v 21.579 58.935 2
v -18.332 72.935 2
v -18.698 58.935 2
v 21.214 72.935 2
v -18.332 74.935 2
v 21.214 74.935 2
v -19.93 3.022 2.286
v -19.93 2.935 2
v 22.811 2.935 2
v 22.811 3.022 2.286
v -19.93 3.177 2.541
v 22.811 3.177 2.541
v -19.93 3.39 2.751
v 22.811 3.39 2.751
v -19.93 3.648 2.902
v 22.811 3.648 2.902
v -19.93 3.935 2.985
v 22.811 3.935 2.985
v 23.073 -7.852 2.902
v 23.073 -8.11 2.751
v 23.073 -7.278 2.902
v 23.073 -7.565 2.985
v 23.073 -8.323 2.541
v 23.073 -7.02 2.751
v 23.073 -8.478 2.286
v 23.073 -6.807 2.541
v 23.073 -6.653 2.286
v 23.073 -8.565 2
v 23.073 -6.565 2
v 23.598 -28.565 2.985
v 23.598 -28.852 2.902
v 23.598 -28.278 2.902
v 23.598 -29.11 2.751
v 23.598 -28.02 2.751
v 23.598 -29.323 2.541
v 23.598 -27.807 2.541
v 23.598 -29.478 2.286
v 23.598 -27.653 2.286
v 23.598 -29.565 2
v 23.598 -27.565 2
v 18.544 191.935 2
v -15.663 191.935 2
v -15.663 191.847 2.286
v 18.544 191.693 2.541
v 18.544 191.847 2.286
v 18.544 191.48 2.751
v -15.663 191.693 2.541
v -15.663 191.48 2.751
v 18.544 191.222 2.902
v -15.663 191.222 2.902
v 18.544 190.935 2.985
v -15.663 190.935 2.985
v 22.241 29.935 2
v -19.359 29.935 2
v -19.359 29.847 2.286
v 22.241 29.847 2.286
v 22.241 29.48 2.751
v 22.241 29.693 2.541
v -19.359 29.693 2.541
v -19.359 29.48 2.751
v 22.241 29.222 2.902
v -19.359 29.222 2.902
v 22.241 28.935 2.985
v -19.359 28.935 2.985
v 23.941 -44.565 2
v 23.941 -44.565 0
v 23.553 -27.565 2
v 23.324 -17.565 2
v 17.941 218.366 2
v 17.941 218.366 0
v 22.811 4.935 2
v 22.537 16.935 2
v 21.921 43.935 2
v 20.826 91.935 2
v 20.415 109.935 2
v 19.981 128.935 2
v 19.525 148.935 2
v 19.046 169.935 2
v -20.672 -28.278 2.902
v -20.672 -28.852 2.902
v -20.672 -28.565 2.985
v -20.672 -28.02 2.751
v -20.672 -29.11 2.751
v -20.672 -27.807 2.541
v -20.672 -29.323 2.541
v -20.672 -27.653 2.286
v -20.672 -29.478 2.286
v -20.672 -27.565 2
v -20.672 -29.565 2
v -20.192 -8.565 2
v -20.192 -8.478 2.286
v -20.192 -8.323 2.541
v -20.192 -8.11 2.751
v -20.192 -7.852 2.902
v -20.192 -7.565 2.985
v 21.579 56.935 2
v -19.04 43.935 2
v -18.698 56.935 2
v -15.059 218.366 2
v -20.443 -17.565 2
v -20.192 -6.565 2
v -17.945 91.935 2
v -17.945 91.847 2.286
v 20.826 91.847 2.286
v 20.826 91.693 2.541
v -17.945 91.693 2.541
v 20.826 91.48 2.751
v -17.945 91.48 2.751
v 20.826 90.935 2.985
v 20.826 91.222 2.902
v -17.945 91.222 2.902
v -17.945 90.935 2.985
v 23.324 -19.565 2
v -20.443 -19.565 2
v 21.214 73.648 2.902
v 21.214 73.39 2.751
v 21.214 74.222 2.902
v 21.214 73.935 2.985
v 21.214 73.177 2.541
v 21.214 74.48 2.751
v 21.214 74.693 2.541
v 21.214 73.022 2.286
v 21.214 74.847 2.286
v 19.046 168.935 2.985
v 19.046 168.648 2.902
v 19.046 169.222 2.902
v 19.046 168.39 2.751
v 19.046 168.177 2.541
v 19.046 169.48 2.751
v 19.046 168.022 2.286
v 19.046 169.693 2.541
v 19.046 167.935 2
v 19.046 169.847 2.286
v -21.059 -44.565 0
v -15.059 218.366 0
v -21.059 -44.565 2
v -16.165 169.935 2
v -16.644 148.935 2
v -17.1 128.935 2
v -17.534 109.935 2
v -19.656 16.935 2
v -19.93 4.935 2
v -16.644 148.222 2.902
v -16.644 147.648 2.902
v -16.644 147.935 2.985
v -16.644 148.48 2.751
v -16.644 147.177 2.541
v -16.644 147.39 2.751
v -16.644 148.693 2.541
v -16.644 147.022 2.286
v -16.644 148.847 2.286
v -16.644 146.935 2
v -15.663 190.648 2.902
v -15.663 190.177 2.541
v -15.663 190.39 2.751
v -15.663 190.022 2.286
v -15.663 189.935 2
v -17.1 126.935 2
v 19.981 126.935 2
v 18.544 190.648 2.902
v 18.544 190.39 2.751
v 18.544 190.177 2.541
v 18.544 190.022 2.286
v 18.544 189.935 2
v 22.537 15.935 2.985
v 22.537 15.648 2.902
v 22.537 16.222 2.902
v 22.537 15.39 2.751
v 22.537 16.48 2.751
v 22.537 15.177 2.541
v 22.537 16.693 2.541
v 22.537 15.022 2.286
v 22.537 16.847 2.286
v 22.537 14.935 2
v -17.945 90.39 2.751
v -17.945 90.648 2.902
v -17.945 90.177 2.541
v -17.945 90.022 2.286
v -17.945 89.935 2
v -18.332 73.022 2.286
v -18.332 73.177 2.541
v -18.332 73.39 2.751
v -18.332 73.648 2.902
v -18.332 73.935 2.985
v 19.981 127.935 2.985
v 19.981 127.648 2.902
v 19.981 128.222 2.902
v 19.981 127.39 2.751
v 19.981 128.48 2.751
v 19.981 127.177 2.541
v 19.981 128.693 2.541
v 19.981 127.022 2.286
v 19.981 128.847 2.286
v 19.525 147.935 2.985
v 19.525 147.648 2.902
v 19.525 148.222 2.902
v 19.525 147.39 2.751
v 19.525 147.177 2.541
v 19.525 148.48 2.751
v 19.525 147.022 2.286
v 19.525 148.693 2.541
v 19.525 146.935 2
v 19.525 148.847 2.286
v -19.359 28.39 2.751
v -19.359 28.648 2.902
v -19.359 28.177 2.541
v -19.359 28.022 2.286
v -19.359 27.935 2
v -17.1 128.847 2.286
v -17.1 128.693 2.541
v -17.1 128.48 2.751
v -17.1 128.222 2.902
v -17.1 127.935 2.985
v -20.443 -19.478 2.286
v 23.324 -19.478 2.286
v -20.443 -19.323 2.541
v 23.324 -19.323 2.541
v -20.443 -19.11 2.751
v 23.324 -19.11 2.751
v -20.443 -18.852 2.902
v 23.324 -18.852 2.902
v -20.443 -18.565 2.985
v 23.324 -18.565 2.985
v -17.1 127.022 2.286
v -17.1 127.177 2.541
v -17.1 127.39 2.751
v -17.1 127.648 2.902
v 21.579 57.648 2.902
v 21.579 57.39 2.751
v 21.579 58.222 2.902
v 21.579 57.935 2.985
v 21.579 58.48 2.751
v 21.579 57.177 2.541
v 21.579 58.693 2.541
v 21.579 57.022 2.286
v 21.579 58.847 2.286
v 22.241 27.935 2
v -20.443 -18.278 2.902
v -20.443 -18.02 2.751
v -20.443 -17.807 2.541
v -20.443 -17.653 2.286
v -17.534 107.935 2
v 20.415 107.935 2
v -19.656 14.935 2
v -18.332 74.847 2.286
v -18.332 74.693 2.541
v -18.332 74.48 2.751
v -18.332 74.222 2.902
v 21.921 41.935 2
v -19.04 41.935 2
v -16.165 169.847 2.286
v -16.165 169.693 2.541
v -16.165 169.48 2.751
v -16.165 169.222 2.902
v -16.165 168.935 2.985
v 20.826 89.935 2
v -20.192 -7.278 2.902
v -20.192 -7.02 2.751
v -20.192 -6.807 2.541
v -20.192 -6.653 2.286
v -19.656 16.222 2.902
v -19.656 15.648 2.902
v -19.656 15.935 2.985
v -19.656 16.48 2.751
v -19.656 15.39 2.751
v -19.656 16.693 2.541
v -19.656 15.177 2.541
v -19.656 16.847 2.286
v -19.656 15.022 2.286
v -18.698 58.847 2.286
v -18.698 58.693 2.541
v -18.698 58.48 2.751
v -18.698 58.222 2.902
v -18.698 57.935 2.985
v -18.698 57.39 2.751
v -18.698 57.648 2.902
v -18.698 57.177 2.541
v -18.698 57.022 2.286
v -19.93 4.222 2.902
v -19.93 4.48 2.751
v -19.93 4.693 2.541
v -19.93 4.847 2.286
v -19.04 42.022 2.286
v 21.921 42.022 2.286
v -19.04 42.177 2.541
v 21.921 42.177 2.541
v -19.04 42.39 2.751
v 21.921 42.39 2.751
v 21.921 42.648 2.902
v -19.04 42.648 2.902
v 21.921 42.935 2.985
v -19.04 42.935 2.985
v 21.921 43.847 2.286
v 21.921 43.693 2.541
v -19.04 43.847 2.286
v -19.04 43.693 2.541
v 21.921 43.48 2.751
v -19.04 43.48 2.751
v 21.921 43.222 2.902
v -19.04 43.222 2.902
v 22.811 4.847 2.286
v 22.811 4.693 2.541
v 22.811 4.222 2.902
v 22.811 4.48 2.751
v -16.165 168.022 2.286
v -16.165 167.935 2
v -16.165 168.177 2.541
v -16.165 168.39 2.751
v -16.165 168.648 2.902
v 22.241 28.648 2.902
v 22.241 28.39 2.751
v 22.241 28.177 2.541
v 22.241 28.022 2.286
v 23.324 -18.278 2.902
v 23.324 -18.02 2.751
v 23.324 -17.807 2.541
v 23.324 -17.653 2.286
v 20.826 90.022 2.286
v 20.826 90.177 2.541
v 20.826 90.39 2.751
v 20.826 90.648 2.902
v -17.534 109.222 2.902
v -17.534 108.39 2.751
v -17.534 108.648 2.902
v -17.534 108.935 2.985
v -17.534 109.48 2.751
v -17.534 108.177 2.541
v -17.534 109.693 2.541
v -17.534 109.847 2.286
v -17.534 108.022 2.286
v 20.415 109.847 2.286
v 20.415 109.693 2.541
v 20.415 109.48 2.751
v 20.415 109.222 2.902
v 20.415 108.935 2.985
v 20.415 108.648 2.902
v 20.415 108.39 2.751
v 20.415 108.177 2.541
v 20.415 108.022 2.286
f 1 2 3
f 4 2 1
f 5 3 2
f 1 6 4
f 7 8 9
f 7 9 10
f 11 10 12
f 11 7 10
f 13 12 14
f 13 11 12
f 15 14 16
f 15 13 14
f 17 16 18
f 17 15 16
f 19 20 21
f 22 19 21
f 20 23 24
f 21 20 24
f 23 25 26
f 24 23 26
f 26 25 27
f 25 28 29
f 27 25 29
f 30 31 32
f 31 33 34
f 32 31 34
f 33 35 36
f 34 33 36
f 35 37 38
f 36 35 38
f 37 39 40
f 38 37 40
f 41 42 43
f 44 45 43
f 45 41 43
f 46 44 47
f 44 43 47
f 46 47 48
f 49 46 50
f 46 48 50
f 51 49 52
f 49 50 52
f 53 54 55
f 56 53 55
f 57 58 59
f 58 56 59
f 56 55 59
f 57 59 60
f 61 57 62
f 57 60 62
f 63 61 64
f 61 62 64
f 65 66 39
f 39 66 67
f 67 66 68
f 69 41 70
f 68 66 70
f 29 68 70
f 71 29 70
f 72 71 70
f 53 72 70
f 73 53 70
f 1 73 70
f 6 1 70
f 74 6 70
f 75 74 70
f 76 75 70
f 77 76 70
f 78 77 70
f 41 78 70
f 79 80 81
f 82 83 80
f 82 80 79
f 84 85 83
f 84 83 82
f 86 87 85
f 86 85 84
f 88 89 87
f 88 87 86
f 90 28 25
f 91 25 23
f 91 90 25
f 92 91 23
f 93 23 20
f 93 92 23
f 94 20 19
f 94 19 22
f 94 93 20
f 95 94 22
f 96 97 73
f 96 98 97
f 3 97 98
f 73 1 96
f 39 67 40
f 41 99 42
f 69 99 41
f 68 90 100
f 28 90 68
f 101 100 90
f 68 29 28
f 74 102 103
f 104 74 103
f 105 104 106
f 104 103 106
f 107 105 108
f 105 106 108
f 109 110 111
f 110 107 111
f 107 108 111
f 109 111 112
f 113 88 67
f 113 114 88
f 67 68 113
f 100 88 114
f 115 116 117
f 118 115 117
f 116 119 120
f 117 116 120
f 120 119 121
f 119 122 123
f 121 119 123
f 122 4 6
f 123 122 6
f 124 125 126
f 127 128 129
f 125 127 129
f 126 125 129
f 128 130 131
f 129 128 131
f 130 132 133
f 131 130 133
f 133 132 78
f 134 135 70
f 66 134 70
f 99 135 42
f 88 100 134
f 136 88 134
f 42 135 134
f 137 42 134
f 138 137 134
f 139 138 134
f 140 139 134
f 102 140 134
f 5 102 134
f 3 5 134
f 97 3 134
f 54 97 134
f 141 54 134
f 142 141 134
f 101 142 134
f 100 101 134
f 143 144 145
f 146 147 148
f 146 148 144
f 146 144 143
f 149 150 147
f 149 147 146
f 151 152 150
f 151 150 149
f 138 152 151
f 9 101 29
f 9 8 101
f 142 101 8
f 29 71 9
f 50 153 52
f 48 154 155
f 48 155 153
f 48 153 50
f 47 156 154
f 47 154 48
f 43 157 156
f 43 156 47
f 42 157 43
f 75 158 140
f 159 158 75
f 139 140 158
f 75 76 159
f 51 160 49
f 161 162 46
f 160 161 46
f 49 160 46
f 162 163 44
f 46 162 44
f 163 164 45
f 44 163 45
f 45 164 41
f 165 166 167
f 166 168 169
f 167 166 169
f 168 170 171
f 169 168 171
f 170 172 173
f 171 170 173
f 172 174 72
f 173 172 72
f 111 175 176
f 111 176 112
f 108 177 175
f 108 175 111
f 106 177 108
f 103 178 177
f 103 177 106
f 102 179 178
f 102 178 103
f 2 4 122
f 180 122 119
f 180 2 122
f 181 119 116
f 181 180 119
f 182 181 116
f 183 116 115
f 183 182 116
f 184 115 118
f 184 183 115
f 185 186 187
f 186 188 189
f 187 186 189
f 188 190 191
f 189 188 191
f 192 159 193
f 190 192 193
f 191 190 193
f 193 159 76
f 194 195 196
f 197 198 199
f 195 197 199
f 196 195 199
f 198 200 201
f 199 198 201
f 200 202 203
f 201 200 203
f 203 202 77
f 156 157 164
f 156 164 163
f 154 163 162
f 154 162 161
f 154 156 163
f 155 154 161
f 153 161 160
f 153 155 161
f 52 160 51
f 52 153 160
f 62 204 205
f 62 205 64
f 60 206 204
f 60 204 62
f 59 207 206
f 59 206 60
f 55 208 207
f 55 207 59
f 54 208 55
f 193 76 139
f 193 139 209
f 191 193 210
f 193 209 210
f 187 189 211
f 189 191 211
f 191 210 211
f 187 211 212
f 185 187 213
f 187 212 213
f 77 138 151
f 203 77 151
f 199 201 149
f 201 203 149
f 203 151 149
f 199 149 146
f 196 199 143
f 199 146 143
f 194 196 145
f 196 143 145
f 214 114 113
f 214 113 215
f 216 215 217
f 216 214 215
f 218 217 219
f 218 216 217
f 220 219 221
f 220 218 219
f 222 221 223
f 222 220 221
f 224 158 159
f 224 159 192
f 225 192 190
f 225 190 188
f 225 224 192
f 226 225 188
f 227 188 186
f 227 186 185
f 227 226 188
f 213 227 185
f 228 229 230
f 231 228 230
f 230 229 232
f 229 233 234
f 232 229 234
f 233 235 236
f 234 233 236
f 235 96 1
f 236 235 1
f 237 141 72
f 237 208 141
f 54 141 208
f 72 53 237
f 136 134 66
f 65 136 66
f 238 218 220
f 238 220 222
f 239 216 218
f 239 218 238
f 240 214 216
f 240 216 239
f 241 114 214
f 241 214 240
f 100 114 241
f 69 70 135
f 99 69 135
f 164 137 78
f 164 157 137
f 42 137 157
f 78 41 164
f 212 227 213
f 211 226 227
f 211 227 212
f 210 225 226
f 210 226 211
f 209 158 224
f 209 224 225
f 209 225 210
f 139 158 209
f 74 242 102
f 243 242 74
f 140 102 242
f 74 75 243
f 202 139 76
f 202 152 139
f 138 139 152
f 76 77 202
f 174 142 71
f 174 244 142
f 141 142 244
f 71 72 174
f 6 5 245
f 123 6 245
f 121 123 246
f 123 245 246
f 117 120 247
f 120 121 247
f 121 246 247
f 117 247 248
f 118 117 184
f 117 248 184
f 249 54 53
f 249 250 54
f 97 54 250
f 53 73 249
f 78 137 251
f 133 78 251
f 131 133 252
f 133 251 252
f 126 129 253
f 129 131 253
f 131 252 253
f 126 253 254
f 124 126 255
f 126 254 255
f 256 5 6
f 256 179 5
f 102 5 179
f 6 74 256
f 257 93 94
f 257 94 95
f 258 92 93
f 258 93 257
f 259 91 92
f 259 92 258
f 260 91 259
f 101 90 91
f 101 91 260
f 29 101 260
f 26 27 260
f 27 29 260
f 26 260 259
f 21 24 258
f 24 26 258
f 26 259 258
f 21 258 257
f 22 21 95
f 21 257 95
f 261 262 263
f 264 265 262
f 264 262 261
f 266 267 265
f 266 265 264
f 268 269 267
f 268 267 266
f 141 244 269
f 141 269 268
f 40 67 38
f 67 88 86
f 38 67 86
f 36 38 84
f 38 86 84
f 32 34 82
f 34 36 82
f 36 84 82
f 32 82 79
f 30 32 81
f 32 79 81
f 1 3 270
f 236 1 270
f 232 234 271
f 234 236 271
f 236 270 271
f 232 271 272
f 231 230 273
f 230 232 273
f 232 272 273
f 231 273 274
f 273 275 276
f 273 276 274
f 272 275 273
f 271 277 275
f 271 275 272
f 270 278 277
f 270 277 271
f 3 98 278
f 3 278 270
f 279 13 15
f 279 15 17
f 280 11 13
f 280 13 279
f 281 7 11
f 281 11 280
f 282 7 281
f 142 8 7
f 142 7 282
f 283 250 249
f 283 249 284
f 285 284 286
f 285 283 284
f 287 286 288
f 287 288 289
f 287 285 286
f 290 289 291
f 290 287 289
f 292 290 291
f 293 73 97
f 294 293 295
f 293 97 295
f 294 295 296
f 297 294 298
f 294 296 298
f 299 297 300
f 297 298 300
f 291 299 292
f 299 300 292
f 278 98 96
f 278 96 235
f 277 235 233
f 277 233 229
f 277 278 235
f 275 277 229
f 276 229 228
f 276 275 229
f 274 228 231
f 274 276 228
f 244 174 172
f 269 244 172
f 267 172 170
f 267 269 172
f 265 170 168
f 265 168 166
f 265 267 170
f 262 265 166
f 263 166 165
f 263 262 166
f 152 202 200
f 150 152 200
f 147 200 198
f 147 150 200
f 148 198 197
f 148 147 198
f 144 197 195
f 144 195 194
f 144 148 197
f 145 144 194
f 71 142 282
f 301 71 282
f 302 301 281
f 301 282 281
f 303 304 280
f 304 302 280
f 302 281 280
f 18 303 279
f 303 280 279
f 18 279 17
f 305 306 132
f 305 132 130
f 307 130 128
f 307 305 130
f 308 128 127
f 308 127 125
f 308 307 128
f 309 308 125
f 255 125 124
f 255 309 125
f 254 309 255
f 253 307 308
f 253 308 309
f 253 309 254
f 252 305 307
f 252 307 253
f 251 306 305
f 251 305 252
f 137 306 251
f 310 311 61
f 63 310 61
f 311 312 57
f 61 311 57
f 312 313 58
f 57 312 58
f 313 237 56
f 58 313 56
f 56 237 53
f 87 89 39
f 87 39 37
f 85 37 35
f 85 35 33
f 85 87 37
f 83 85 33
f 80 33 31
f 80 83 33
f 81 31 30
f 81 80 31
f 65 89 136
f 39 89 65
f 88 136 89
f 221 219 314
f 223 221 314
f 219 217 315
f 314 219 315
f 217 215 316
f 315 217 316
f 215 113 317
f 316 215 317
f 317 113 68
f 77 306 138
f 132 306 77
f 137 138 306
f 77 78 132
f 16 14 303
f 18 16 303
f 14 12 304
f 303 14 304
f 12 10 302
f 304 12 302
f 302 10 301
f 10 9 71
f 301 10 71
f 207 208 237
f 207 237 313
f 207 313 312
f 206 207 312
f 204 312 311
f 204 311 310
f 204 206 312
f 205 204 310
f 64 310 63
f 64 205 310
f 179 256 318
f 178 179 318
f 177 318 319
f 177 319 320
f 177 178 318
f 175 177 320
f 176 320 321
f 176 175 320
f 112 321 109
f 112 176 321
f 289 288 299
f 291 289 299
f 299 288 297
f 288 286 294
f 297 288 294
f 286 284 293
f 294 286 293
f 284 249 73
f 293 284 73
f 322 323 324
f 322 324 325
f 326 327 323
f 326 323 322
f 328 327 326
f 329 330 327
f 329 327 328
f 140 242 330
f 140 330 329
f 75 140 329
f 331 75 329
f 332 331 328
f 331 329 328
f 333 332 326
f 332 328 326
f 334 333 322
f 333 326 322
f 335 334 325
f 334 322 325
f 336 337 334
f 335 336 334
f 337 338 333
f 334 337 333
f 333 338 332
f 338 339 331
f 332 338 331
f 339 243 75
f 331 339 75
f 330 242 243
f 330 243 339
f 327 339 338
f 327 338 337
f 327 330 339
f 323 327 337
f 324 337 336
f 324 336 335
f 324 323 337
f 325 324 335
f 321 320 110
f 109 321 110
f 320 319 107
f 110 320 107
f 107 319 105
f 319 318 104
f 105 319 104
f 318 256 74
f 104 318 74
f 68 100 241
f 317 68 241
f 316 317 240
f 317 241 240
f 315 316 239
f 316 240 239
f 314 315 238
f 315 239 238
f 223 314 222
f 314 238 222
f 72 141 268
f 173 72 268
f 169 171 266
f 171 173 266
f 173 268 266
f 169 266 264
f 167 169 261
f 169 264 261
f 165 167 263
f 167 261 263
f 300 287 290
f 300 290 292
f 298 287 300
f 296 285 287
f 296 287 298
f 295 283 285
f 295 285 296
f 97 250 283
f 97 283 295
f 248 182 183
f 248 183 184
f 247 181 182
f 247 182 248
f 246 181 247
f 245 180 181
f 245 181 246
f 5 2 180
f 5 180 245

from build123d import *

# Parameters (mm, degrees)
F1_DEPTH     = 2
F2_W         = 44.2697719236
F2_H         = 2
F2_W_2       = 43.7677401211
F2_W_3       = 43.2657083186
F2_W_4       = 42.7408568887
F2_W_5       = 42.1931858314
F2_W_6       = 41.5998755193
F2_W_7       = 40.9609259524
F2_W_8       = 40.2763371308
F2_W_9       = 39.5461090544
F2_W_10      = 38.7702417233
F2_W_11      = 37.9487351373
F2_W_12      = 37.0815892966
F2_W_13      = 36.1688042011
F2_W_14      = 35.2103798508
F2_W_15      = 34.2063162458
F3_DEPTH     = 1
F4_T1_DEPTH  = 50.2158074986
F4_T3_DEPTH  = 3.0186569416
F4_T5_DEPTH  = 47.197150557
F4_T7_DEPTH  = 49.7137756961
F4_T9_DEPTH  = 49.2117438936
F4_T11_DEPTH = 48.6868924637
F4_T13_DEPTH = 48.1392214064
F4_T15_DEPTH = 47.5459110943
F4_T17_DEPTH = 46.9069615275
F4_T19_DEPTH = 46.2223727058
F4_T21_DEPTH = 45.4921446294
F4_T23_DEPTH = 44.7162772983
F4_T25_DEPTH = 43.8947707123
F4_T27_DEPTH = 43.0276248716
F4_T29_DEPTH = 42.1148397761
F4_T31_DEPTH = 41.1564154259
F4_T33_DEPTH = 40.1523518208


# Not quite as in the source:
# - a fillet or chamfer that OpenCascade refuses, or shapes differently, is made with other operations: its cross-section is extruded or revolved along the edge and cut away or added


with BuildPart() as f1:
    # F0 (on Top) → F1 (new body)
    with BuildSketch(Plane.XY):
        Polygon((17.9405650105, 218.366242675), (-15.0594349895, 218.366242675), (-21.0594349895, -44.5653073527), (23.9405650105, -44.5653073527), align=None)
    extrude(amount=F1_DEPTH)

    # F2 (on face) → F3 (join)
    with BuildSketch(Plane.XY.offset(2)):
        with Locations((1.4633846378, -28.5653073527)):
            Rectangle(F2_W, F2_H)
        with Locations((1.4405650105, -18.5653073527)):
            Rectangle(F2_W_2, F2_H)
        with Locations((1.4405650105, -7.5653073527)):
            Rectangle(F2_W_3, F2_H)
        with Locations((1.4405650105, 3.9346926473)):
            Rectangle(F2_W_4, F2_H)
        with Locations((1.4405650105, 15.9346926473)):
            Rectangle(F2_W_5, F2_H)
        with Locations((1.4405650105, 28.9346926473)):
            Rectangle(F2_W_6, F2_H)
        with Locations((1.4405650105, 42.9346926473)):
            Rectangle(F2_W_7, F2_H)
        with Locations((1.4405650105, 57.9346926473)):
            Rectangle(F2_W_8, F2_H)
        with Locations((1.4405650105, 73.9346926473)):
            Rectangle(F2_W_9, F2_H)
        with Locations((1.4405650105, 90.9346926473)):
            Rectangle(F2_W_10, F2_H)
        with Locations((1.4405650105, 108.9346926473)):
            Rectangle(F2_W_11, F2_H)
        with Locations((1.4405650105, 127.9346926473)):
            Rectangle(F2_W_12, F2_H)
        with Locations((1.4405650105, 147.9346926473)):
            Rectangle(F2_W_13, F2_H)
        with Locations((1.4405650105, 168.9346926473)):
            Rectangle(F2_W_14, F2_H)
        with Locations((1.4405650105, 190.9346926473)):
            Rectangle(F2_W_15, F2_H)
    extrude(amount=F3_DEPTH)

    # F4: fillet of radius 1.2071067812 on 30 edges, made by hand

    # F4_s2 → F4_t1 (cut)
    with BuildSketch(Plane.YZ.offset(-23.6445191115)):
        with BuildLine():
            ThreePointArc((-29.5653073527, 2), (-29.1529872247, 2.7167727513), (-28.3761002377, 3))
            Line((-28.3761002377, 3), (-29.5653073527, 3))
            Line((-29.5653073527, 3), (-29.5653073527, 2))
        make_face()
    extrude(amount=F4_T1_DEPTH, mode=Mode.SUBTRACT)

    # F4_s4 → F4_t3 (cut)
    with BuildSketch(Plane.YZ.offset(23.5526314455)):
        with BuildLine():
            ThreePointArc((-27.5653073527, 2), (-27.9776274807, 2.7167727513), (-28.7545144677, 3))
            Line((-28.7545144677, 3), (-27.5653073527, 3))
            Line((-27.5653073527, 3), (-27.5653073527, 2))
        make_face()
    extrude(amount=F4_T3_DEPTH, mode=Mode.SUBTRACT)

    # F4_s6 → F4_t5 (cut)
    with BuildSketch(Plane.YZ.offset(-23.6445191115)):
        with BuildLine():
            ThreePointArc((-27.5653073527, 2), (-27.9776274807, 2.7167727513), (-28.7545144677, 3))
            Line((-28.7545144677, 3), (-27.5653073527, 3))
            Line((-27.5653073527, 3), (-27.5653073527, 2))
        make_face()
    extrude(amount=F4_T5_DEPTH, mode=Mode.SUBTRACT)

    # F4_s8 → F4_t7 (cut)
    with BuildSketch(Plane.YZ.offset(-23.4163228376)):
        with BuildLine():
            ThreePointArc((-19.5653073527, 2), (-19.1529872247, 2.7167727513), (-18.3761002377, 3))
            Line((-18.3761002377, 3), (-19.5653073527, 3))
            Line((-19.5653073527, 3), (-19.5653073527, 2))
        make_face()
        with BuildLine():
            ThreePointArc((-17.5653073527, 2), (-17.9776274807, 2.7167727513), (-18.7545144677, 3))
            Line((-18.7545144677, 3), (-17.5653073527, 3))
            Line((-17.5653073527, 3), (-17.5653073527, 2))
        make_face()
    extrude(amount=F4_T7_DEPTH, mode=Mode.SUBTRACT)

    # F4_s10 → F4_t9 (cut)
    with BuildSketch(Plane.YZ.offset(-23.1653069363)):
        with BuildLine():
            ThreePointArc((-8.5653073527, 2), (-8.1529872247, 2.7167727513), (-7.3761002377, 3))
            Line((-7.3761002377, 3), (-8.5653073527, 3))
            Line((-8.5653073527, 3), (-8.5653073527, 2))
        make_face()
        with BuildLine():
            ThreePointArc((-6.5653073527, 2), (-6.9776274807, 2.7167727513), (-7.7545144677, 3))
            Line((-7.7545144677, 3), (-6.5653073527, 3))
            Line((-6.5653073527, 3), (-6.5653073527, 2))
        make_face()
    extrude(amount=F4_T9_DEPTH, mode=Mode.SUBTRACT)

    # F4_s12 → F4_t11 (cut)
    with BuildSketch(Plane.YZ.offset(-22.9028812214)):
        with BuildLine():
            ThreePointArc((2.9346926473, 2), (3.3470127753, 2.7167727513), (4.1238997623, 3))
            Line((4.1238997623, 3), (2.9346926473, 3))
            Line((2.9346926473, 3), (2.9346926473, 2))
        make_face()
        with BuildLine():
            ThreePointArc((4.9346926473, 2), (4.5223725193, 2.7167727513), (3.7454855323, 3))
            Line((3.7454855323, 3), (4.9346926473, 3))
            Line((4.9346926473, 3), (4.9346926473, 2))
        make_face()
    extrude(amount=F4_T11_DEPTH, mode=Mode.SUBTRACT)

    # F4_s14 → F4_t13 (cut)
    with BuildSketch(Plane.YZ.offset(-22.6290456927)):
        with BuildLine():
            ThreePointArc((14.9346926473, 2), (15.3470127753, 2.7167727513), (16.1238997623, 3))
            Line((16.1238997623, 3), (14.9346926473, 3))
            Line((14.9346926473, 3), (14.9346926473, 2))
        make_face()
        with BuildLine():
            ThreePointArc((16.9346926473, 2), (16.5223725193, 2.7167727513), (15.7454855323, 3))
            Line((15.7454855323, 3), (16.9346926473, 3))
            Line((16.9346926473, 3), (16.9346926473, 2))
        make_face()
    extrude(amount=F4_T13_DEPTH, mode=Mode.SUBTRACT)

    # F4_s16 → F4_t15 (cut)
    with BuildSketch(Plane.YZ.offset(-22.3323905367)):
        with BuildLine():
            ThreePointArc((27.9346926473, 2), (28.3470127753, 2.7167727513), (29.1238997623, 3))
            Line((29.1238997623, 3), (27.9346926473, 3))
            Line((27.9346926473, 3), (27.9346926473, 2))
        make_face()
        with BuildLine():
            ThreePointArc((29.9346926473, 2), (29.5223725193, 2.7167727513), (28.7454855323, 3))
            Line((28.7454855323, 3), (29.9346926473, 3))
            Line((29.9346926473, 3), (29.9346926473, 2))
        make_face()
    extrude(amount=F4_T15_DEPTH, mode=Mode.SUBTRACT)

    # F4_s18 → F4_t17 (cut)
    with BuildSketch(Plane.YZ.offset(-22.0129157533)):
        with BuildLine():
            ThreePointArc((41.9346926473, 2), (42.3470127753, 2.7167727513), (43.1238997623, 3))
            Line((43.1238997623, 3), (41.9346926473, 3))
            Line((41.9346926473, 3), (41.9346926473, 2))
        make_face()
        with BuildLine():
            ThreePointArc((43.9346926473, 2), (43.5223725193, 2.7167727513), (42.7454855323, 3))
            Line((42.7454855323, 3), (43.9346926473, 3))
            Line((43.9346926473, 3), (43.9346926473, 2))
        make_face()
    extrude(amount=F4_T17_DEPTH, mode=Mode.SUBTRACT)

    # F4_s20 → F4_t19 (cut)
    with BuildSketch(Plane.YZ.offset(-21.6706213425)):
        with BuildLine():
            ThreePointArc((56.9346926473, 2), (57.3470127753, 2.7167727513), (58.1238997623, 3))
            Line((58.1238997623, 3), (56.9346926473, 3))
            Line((56.9346926473, 3), (56.9346926473, 2))
        make_face()
        with BuildLine():
            ThreePointArc((58.9346926473, 2), (58.5223725193, 2.7167727513), (57.7454855323, 3))
            Line((57.7454855323, 3), (58.9346926473, 3))
            Line((58.9346926473, 3), (58.9346926473, 2))
        make_face()
    extrude(amount=F4_T19_DEPTH, mode=Mode.SUBTRACT)

    # F4_s22 → F4_t21 (cut)
    with BuildSketch(Plane.YZ.offset(-21.3055073043)):
        with BuildLine():
            ThreePointArc((72.9346926473, 2), (73.3470127753, 2.7167727513), (74.1238997623, 3))
            Line((74.1238997623, 3), (72.9346926473, 3))
            Line((72.9346926473, 3), (72.9346926473, 2))
        make_face()
        with BuildLine():
            ThreePointArc((74.9346926473, 2), (74.5223725193, 2.7167727513), (73.7454855323, 3))
            Line((73.7454855323, 3), (74.9346926473, 3))
            Line((74.9346926473, 3), (74.9346926473, 2))
        make_face()
    extrude(amount=F4_T21_DEPTH, mode=Mode.SUBTRACT)

    # F4_s24 → F4_t23 (cut)
    with BuildSketch(Plane.YZ.offset(-20.9175736387)):
        with BuildLine():
            ThreePointArc((89.9346926473, 2), (90.3470127753, 2.7167727513), (91.1238997623, 3))
            Line((91.1238997623, 3), (89.9346926473, 3))
            Line((89.9346926473, 3), (89.9346926473, 2))
        make_face()
        with BuildLine():
            ThreePointArc((91.9346926473, 2), (91.5223725193, 2.7167727513), (90.7454855323, 3))
            Line((90.7454855323, 3), (91.9346926473, 3))
            Line((91.9346926473, 3), (91.9346926473, 2))
        make_face()
    extrude(amount=F4_T23_DEPTH, mode=Mode.SUBTRACT)

    # F4_s26 → F4_t25 (cut)
    with BuildSketch(Plane.YZ.offset(-20.5068203457)):
        with BuildLine():
            ThreePointArc((107.9346926473, 2), (108.3470127753, 2.7167727513), (109.1238997623, 3))
            Line((109.1238997623, 3), (107.9346926473, 3))
            Line((107.9346926473, 3), (107.9346926473, 2))
        make_face()
        with BuildLine():
            ThreePointArc((109.9346926473, 2), (109.5223725193, 2.7167727513), (108.7454855323, 3))
            Line((108.7454855323, 3), (109.9346926473, 3))
            Line((109.9346926473, 3), (109.9346926473, 2))
        make_face()
    extrude(amount=F4_T25_DEPTH, mode=Mode.SUBTRACT)

    # F4_s28 → F4_t27 (cut)
    with BuildSketch(Plane.YZ.offset(-20.0732474254)):
        with BuildLine():
            ThreePointArc((126.9346926473, 2), (127.3470127753, 2.7167727513), (128.1238997623, 3))
            Line((128.1238997623, 3), (126.9346926473, 3))
            Line((126.9346926473, 3), (126.9346926473, 2))
        make_face()
        with BuildLine():
            ThreePointArc((128.9346926473, 2), (128.5223725193, 2.7167727513), (127.7454855323, 3))
            Line((127.7454855323, 3), (128.9346926473, 3))
            Line((128.9346926473, 3), (128.9346926473, 2))
        make_face()
    extrude(amount=F4_T27_DEPTH, mode=Mode.SUBTRACT)

    # F4_s30 → F4_t29 (cut)
    with BuildSketch(Plane.YZ.offset(-19.6168548776)):
        with BuildLine():
            ThreePointArc((146.9346926473, 2), (147.3470127753, 2.7167727513), (148.1238997623, 3))
            Line((148.1238997623, 3), (146.9346926473, 3))
            Line((146.9346926473, 3), (146.9346926473, 2))
        make_face()
        with BuildLine():
            ThreePointArc((148.9346926473, 2), (148.5223725193, 2.7167727513), (147.7454855323, 3))
            Line((147.7454855323, 3), (148.9346926473, 3))
            Line((148.9346926473, 3), (148.9346926473, 2))
        make_face()
    extrude(amount=F4_T29_DEPTH, mode=Mode.SUBTRACT)

    # F4_s32 → F4_t31 (cut)
    with BuildSketch(Plane.YZ.offset(-19.1376427025)):
        with BuildLine():
            ThreePointArc((167.9346926473, 2), (168.3470127753, 2.7167727513), (169.1238997623, 3))
            Line((169.1238997623, 3), (167.9346926473, 3))
            Line((167.9346926473, 3), (167.9346926473, 2))
        make_face()
        with BuildLine():
            ThreePointArc((169.9346926473, 2), (169.5223725193, 2.7167727513), (168.7454855323, 3))
            Line((168.7454855323, 3), (169.9346926473, 3))
            Line((169.9346926473, 3), (169.9346926473, 2))
        make_face()
    extrude(amount=F4_T31_DEPTH, mode=Mode.SUBTRACT)

    # F4_s34 → F4_t33 (cut)
    with BuildSketch(Plane.YZ.offset(-18.6356109)):
        with BuildLine():
            ThreePointArc((189.9346926473, 2), (190.3470127753, 2.7167727513), (191.1238997623, 3))
            Line((191.1238997623, 3), (189.9346926473, 3))
            Line((189.9346926473, 3), (189.9346926473, 2))
        make_face()
        with BuildLine():
            ThreePointArc((191.9346926473, 2), (191.5223725193, 2.7167727513), (190.7454855323, 3))
            Line((190.7454855323, 3), (191.9346926473, 3))
            Line((191.9346926473, 3), (191.9346926473, 2))
        make_face()
    extrude(amount=F4_T33_DEPTH, mode=Mode.SUBTRACT)


solid = f1.part
